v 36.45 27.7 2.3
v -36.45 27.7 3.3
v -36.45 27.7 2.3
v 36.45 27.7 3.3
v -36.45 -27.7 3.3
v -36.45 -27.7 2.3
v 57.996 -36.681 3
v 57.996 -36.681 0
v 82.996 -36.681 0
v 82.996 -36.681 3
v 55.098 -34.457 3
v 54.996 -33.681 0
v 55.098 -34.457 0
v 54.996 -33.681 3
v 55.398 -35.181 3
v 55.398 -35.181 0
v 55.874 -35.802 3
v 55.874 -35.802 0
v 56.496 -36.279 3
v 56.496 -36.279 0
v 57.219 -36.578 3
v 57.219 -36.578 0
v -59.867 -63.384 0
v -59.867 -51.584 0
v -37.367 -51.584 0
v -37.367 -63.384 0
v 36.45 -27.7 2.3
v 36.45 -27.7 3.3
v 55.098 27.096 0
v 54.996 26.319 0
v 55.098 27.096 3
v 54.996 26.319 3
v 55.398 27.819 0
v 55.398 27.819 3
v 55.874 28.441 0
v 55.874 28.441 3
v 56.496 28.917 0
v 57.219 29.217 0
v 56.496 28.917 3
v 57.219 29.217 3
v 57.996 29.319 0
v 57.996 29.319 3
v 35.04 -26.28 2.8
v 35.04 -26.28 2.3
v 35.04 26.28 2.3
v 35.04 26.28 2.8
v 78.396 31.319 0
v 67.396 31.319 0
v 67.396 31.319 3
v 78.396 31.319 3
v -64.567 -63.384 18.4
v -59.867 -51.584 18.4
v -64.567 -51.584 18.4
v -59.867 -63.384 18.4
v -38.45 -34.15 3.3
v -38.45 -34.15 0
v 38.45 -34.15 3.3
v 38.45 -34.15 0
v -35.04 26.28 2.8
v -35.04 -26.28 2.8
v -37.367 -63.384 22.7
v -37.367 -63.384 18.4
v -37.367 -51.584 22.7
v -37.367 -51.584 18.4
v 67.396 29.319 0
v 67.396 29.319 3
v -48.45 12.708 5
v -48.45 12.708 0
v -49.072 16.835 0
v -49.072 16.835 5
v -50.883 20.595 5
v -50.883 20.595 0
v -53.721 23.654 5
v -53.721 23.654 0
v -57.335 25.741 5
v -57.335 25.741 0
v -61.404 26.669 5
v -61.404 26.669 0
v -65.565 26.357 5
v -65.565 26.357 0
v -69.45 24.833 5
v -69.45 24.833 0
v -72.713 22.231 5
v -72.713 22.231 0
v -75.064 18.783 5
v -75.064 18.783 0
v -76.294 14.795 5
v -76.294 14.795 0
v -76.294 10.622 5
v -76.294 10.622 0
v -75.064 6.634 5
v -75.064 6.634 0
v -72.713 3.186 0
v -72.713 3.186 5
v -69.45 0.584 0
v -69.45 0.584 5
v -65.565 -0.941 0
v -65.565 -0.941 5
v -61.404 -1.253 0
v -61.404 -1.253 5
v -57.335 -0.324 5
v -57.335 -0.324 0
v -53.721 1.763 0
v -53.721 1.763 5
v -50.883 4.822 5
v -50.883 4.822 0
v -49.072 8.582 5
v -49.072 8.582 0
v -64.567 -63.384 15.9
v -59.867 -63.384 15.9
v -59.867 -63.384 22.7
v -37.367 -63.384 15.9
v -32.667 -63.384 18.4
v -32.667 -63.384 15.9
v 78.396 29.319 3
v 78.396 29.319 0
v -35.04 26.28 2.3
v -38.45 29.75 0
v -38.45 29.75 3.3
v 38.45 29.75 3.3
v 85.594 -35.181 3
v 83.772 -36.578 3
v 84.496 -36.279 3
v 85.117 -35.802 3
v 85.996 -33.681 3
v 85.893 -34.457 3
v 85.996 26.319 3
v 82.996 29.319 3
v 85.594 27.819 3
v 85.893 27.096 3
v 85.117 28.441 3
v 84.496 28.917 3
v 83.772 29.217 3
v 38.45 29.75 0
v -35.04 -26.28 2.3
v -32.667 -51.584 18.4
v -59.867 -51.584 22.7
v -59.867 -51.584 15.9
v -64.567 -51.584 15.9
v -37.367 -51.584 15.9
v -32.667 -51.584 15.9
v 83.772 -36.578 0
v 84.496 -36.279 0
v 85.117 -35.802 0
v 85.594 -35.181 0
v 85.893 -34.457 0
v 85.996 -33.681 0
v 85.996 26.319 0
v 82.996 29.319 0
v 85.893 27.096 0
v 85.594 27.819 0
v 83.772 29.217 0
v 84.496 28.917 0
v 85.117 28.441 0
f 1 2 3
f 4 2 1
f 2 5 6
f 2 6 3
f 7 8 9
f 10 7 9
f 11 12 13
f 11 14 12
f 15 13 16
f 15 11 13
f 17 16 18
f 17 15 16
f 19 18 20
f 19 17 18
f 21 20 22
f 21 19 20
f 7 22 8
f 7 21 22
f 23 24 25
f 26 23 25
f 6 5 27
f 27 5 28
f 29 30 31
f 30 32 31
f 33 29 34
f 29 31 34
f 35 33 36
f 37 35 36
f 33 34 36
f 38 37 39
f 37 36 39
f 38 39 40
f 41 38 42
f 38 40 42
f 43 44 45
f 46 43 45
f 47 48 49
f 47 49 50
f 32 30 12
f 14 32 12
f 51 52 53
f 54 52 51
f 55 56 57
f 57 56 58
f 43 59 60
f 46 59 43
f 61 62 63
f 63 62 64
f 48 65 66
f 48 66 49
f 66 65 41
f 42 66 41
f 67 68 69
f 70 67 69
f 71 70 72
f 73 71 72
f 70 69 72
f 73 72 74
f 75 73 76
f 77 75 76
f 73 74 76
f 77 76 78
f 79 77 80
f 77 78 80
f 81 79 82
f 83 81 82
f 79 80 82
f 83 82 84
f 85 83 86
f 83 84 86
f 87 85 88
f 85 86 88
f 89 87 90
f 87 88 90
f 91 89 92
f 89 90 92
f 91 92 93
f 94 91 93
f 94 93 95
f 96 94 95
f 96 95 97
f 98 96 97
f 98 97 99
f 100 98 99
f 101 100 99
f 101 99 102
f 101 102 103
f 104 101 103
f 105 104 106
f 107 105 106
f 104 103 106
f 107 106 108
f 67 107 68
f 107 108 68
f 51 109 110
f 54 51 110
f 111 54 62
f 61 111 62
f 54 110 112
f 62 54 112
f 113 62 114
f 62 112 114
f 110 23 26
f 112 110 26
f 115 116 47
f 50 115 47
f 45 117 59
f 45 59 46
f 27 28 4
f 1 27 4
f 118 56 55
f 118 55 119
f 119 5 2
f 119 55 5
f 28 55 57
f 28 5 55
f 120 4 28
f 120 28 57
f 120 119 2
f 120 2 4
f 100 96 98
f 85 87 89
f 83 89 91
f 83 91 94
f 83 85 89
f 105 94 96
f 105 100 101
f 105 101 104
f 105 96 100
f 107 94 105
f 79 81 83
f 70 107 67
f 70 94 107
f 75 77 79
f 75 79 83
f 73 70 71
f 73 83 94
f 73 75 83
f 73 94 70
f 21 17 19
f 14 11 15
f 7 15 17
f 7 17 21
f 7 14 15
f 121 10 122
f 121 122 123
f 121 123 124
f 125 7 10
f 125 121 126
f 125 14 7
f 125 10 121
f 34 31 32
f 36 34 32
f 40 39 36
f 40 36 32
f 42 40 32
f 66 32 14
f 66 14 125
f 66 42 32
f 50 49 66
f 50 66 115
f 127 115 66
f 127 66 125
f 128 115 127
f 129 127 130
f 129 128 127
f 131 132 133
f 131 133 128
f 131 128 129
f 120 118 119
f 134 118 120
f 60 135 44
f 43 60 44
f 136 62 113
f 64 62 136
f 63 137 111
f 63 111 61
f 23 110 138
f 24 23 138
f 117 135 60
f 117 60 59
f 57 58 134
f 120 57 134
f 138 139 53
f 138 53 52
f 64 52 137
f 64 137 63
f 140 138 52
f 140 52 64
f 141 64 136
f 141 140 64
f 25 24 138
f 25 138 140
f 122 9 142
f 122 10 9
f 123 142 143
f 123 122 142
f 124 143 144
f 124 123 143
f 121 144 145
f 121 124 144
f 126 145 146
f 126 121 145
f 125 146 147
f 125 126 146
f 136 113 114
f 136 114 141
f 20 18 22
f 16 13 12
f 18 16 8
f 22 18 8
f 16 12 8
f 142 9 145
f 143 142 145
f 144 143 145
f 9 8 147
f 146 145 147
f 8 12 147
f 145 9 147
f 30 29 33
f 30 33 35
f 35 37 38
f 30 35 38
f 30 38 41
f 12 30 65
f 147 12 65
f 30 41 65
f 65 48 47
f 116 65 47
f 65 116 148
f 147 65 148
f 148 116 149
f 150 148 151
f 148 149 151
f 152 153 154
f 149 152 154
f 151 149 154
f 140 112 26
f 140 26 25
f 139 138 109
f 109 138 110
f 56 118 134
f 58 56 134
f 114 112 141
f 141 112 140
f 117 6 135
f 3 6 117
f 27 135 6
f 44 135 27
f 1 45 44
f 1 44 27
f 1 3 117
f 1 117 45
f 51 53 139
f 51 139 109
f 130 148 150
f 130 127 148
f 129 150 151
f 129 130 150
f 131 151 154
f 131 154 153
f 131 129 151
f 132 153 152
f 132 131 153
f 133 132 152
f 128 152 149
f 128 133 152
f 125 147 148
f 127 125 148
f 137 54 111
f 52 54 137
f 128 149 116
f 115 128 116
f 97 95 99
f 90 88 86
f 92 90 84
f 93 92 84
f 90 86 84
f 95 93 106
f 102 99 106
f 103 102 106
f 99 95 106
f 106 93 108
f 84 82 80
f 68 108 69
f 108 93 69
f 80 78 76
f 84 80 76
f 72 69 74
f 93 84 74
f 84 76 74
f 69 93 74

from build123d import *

# Parameters (mm, degrees)
F0_W      = 76.9
F0_H      = 63.9
F1_DEPTH  = 3.3
F2_W      = 72.9
F2_H      = 55.4
F3_DEPTH  = 1
F4_W      = 70.08
F4_H      = 52.56
F5_DEPTH  = 0.5
F6_R      = 14
F7_DEPTH  = 5
F8_W      = 11
F8_H      = 2
F9_DEPTH  = 3
F10_R     = 3
F11_W     = 22.5
F11_H     = 11.8
F12_DEPTH = 22.7
F13_W     = 11.8
F13_H     = 2.5
F14_DEPTH = 4.7
F15_W     = 11.8
F15_H     = 2.5
F16_DEPTH = 4.7


with BuildPart() as f1:
    # F0 (on Top) → F1 (new body)
    with BuildSketch(Plane.XY):
        with Locations((0, -2.2)):
            Rectangle(F0_W, F0_H)
    extrude(amount=F1_DEPTH)

    # F2 (on face) → F3 (cut)
    with BuildSketch(Plane.XY.offset(3.3)):
        Rectangle(F2_W, F2_H)
    extrude(amount=-F3_DEPTH, mode=Mode.SUBTRACT)

    # F4 (on face) → F5 (join)
    with BuildSketch(Plane.XY.offset(2.3)):
        Rectangle(F4_W, F4_H)
    extrude(amount=F5_DEPTH)


with BuildPart() as f7:
    # F6 (on Top) → F7 (new body)
    with BuildSketch(Plane.XY):
        with Locations((-62.45, 12.708299)):
            Circle(F6_R)
    extrude(amount=F7_DEPTH)


with BuildPart() as f9:
    # F8 (on Top) → F9 (new body)
    with BuildSketch(Plane.XY):
        Polygon((67.395655, 29.319293), (54.995655, 29.319293), (54.995655, -36.680707), (85.995655, -36.680707), (85.995655, 29.319293), (78.395655, 29.319293), align=None)
        with Locations((72.895655, 30.319293)):
            Rectangle(F8_W, F8_H)
    extrude(amount=F9_DEPTH)

    # F10
    f10_edges = [f9.edges().sort_by_distance(p)[0] for p in [
        (85.995655, -36.680707, 1.5),
        (54.995655, -36.680707, 1.5),
        (54.995655, 29.319293, 1.5),
        (85.995655, 29.319293, 1.5),
    ]]
    fillet(f10_edges, radius=F10_R)


with BuildPart() as f12:
    # F11 (on Top) → F12 (new body)
    with BuildSketch(Plane.XY):
        with Locations((-48.616868, -57.483677)):
            Rectangle(F11_W, F11_H)
    extrude(amount=F12_DEPTH)

    # F13 (on face) → F14 (join)
    with BuildSketch(Plane(origin=(-59.866868, 0, 0), x_dir=(0, -1, 0), z_dir=(-1, 0, 0))):
        with Locations((57.483677, 17.15)):
            Rectangle(F13_W, F13_H)
    extrude(amount=F14_DEPTH)

    # F15 (on face) → F16 (join)
    with BuildSketch(Plane.YZ.offset(-37.366868)):
        with Locations((-57.483677, 17.15)):
            Rectangle(F15_W, F15_H)
    extrude(amount=F16_DEPTH)


solid = Compound([f1.part, f7.part, f9.part, f12.part])
